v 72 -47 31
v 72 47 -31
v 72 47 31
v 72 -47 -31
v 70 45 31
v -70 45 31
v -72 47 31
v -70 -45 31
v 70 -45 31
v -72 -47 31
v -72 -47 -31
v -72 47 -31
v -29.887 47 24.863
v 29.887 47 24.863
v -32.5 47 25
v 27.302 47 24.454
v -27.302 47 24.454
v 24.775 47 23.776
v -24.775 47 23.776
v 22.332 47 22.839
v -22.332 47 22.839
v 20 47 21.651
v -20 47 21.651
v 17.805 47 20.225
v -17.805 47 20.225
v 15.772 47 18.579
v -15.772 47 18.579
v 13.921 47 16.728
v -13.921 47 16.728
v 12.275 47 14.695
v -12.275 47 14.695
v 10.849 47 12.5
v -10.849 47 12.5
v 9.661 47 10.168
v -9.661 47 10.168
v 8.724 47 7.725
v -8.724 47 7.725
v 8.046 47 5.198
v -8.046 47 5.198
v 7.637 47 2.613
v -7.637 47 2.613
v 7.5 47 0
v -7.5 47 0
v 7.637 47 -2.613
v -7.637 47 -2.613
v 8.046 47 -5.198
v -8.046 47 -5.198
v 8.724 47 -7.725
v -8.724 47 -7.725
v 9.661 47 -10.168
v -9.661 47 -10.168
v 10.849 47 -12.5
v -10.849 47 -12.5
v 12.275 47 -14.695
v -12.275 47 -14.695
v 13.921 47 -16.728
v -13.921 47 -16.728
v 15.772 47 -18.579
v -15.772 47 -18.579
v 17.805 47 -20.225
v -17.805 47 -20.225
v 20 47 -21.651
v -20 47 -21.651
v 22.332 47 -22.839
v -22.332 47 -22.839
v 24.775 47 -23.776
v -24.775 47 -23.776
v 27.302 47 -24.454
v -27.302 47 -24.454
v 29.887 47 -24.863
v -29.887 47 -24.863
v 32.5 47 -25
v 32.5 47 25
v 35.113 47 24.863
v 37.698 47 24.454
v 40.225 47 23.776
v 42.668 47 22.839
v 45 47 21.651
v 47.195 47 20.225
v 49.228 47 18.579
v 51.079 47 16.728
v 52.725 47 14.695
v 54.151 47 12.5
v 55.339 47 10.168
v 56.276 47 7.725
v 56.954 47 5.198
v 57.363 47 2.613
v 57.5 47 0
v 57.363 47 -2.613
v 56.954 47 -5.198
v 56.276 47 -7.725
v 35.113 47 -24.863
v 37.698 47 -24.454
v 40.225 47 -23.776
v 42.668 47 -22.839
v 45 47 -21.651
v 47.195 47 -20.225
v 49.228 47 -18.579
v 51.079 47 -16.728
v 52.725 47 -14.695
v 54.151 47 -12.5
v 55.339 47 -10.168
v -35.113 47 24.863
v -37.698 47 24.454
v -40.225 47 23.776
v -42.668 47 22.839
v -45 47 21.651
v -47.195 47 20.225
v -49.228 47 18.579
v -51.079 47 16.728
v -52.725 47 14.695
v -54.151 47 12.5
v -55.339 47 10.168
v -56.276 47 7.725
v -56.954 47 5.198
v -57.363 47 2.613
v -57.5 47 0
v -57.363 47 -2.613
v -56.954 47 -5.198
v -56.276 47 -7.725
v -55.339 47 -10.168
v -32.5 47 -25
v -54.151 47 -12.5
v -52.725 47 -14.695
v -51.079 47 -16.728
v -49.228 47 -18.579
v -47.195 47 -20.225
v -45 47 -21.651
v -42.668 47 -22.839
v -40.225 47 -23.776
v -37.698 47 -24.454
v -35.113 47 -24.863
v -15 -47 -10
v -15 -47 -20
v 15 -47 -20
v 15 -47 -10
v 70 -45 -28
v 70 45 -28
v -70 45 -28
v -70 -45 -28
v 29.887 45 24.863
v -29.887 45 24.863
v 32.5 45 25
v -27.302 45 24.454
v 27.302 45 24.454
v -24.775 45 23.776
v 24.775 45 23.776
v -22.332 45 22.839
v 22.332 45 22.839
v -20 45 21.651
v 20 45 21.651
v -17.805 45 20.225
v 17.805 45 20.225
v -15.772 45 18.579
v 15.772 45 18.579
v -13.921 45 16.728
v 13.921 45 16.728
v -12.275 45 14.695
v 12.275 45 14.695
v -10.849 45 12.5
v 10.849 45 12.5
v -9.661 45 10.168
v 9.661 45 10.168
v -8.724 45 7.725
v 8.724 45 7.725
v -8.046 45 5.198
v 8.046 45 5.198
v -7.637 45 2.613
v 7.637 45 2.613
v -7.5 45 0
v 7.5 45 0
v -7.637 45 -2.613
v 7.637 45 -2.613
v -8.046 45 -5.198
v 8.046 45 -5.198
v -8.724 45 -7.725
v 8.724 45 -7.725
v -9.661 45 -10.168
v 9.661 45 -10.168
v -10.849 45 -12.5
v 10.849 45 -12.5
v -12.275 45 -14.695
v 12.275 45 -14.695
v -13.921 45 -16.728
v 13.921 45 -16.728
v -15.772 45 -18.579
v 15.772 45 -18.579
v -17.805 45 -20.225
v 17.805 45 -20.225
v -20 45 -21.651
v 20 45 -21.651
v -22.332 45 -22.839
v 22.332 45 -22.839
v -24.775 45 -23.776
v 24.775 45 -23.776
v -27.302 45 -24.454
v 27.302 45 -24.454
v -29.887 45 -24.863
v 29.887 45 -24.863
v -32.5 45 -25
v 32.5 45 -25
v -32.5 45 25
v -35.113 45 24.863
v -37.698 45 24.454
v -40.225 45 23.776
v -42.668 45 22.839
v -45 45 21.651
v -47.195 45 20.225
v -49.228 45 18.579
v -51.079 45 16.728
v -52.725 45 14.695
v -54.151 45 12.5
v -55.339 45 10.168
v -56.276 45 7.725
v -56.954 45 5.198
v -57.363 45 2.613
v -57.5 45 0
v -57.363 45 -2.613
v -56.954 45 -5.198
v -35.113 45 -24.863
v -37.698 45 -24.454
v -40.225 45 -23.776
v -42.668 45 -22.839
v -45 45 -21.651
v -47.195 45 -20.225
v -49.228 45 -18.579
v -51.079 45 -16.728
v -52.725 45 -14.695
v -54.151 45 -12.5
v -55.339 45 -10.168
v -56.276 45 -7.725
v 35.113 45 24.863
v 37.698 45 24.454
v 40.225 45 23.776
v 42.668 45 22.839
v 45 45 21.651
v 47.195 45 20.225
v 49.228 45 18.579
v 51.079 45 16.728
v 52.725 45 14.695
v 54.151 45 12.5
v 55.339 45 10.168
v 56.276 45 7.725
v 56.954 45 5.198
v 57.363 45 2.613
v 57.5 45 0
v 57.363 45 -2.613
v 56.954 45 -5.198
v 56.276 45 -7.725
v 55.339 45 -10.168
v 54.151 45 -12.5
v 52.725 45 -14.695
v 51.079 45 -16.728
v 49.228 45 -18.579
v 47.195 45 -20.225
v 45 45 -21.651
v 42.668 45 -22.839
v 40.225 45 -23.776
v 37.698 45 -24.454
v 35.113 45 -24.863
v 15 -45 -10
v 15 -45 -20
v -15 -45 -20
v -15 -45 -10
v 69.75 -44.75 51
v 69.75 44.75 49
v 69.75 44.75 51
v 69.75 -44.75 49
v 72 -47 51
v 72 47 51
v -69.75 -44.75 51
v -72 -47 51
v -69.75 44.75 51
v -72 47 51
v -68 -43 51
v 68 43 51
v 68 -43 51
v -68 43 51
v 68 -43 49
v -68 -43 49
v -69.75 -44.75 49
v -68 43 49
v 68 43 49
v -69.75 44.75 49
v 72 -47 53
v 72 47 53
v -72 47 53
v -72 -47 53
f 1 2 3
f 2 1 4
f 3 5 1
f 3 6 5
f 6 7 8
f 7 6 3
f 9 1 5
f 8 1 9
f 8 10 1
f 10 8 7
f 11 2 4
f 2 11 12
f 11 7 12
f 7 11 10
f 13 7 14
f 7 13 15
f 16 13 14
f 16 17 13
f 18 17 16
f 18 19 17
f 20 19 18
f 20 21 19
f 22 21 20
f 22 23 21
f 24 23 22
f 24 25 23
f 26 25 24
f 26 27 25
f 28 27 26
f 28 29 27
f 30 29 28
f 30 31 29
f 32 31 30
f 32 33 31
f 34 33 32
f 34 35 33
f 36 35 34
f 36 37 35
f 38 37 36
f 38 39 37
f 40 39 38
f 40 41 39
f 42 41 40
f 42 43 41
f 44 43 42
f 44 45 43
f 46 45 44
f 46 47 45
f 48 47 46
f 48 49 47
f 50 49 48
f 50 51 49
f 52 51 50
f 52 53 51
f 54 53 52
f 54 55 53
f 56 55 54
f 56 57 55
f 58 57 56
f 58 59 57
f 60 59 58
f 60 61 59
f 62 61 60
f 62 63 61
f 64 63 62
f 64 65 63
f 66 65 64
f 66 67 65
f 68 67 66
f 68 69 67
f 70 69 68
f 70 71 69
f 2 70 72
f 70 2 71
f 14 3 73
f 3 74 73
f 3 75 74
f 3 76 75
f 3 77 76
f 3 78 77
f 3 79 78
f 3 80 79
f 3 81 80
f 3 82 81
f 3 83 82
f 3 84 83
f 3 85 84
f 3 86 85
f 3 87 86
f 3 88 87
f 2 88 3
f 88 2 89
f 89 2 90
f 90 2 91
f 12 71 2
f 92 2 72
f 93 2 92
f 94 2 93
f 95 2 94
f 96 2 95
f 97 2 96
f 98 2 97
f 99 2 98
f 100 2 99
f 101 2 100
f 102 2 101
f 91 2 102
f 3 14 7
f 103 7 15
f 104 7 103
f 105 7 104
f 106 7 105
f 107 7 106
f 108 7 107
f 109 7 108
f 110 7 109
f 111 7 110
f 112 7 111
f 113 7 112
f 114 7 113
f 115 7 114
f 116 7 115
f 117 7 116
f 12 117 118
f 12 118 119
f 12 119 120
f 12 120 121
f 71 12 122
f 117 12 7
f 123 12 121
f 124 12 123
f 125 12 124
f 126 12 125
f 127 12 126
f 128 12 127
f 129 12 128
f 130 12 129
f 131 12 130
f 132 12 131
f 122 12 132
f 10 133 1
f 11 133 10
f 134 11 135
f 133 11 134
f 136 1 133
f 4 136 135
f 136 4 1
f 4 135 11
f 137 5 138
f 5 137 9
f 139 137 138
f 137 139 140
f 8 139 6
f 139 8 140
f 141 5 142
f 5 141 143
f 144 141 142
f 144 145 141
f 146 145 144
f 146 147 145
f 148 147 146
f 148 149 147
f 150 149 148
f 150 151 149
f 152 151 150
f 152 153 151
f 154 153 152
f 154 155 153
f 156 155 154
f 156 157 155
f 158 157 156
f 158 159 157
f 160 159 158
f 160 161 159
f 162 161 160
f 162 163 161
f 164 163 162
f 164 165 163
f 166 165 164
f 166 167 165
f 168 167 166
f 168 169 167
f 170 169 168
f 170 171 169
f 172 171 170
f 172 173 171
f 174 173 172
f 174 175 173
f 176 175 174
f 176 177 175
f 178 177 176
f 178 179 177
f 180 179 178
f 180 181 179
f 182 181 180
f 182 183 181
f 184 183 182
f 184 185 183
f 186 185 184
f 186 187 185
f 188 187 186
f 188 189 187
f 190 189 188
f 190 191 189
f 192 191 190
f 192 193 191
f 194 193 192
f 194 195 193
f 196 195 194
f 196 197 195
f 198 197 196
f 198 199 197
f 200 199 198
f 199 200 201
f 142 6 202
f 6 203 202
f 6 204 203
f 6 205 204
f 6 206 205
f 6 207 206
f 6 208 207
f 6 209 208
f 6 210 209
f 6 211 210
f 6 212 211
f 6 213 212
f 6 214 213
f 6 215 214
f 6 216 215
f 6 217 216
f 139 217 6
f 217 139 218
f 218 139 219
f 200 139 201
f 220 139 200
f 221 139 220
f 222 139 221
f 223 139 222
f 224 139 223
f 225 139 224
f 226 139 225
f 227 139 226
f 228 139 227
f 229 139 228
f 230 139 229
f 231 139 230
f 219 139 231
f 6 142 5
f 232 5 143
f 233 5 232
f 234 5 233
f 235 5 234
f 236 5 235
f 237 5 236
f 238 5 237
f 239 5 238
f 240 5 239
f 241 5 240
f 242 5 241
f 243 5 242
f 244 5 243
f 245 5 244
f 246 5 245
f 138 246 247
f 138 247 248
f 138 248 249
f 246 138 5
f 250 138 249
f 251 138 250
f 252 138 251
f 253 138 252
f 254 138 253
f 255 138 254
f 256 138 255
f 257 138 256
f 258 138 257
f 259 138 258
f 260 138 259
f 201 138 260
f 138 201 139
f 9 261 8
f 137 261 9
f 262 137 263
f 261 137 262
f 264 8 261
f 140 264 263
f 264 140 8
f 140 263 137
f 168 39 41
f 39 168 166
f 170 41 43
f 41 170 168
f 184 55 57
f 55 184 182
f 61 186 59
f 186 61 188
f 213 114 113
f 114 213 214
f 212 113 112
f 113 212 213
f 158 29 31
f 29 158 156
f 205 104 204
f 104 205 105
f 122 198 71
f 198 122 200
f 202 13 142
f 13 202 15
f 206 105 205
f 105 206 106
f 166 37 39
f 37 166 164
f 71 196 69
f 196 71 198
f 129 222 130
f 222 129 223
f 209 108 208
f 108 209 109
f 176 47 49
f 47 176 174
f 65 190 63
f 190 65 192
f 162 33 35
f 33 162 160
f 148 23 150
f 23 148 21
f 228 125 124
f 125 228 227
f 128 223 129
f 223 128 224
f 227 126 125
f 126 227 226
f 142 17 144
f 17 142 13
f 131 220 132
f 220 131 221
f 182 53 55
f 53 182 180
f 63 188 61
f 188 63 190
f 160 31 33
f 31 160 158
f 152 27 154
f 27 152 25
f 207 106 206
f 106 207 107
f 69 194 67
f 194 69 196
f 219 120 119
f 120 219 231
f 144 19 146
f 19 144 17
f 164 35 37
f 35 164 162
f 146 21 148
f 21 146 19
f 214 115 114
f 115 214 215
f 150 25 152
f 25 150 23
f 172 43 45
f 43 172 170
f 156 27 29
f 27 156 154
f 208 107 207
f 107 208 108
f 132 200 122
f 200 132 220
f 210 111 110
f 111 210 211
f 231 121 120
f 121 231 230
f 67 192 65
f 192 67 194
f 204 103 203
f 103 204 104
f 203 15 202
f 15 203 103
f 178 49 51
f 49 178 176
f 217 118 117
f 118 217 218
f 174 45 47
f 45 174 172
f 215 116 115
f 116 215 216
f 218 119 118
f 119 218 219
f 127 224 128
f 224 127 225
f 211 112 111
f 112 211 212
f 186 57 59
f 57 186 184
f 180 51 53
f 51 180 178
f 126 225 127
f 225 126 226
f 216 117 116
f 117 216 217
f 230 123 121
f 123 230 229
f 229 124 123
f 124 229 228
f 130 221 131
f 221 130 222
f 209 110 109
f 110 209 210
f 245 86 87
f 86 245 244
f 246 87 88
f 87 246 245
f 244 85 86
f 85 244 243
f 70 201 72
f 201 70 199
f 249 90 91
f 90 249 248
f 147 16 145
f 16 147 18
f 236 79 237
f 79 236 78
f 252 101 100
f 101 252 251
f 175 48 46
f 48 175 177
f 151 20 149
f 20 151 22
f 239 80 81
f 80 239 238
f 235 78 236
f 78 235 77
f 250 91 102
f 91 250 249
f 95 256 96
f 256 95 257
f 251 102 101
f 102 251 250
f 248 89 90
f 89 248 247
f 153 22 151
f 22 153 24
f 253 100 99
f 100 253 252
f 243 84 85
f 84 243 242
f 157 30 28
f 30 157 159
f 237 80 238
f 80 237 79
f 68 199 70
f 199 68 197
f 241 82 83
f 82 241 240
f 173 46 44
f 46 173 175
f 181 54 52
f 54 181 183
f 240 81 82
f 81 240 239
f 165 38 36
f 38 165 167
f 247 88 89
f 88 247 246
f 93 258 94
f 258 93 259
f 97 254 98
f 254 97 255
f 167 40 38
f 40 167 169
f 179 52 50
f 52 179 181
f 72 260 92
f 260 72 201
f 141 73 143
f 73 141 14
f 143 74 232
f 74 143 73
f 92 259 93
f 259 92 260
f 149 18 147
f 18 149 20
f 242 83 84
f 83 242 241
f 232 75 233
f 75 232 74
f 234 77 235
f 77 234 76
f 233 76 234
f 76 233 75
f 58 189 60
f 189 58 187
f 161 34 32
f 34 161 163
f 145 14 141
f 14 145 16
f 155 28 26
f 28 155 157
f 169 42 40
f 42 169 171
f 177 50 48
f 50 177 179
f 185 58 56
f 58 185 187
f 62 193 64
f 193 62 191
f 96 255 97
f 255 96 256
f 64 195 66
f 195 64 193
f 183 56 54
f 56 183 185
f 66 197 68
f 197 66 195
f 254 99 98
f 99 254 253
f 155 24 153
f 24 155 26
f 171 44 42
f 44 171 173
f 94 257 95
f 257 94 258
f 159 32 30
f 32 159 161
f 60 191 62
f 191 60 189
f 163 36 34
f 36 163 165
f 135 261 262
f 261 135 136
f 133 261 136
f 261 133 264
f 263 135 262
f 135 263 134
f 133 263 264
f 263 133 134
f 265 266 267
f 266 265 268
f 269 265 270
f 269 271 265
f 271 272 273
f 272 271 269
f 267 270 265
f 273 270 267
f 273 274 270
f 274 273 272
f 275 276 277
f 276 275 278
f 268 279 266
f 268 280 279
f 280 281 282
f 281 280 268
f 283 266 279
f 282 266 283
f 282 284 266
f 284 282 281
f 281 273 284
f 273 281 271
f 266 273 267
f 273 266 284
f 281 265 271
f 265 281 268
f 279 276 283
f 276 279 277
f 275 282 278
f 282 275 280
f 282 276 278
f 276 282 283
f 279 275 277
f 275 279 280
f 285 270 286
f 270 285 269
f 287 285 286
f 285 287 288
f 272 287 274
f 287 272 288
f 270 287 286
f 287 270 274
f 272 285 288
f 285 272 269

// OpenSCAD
// Caixa 3D do Boi (ESP32 + Relé + Amplificador + 2 Alto-Falantes 2")
// Para gerar o arquivo STL para impressão 3D, instale o software grátis OpenSCAD (openscad.org),
// cole este código e aperte F6 para renderizar, depois F7 para exportar para STL.

$fn = 60; // Suavização dos círculos

// Dimensões internas da caixa (Ajustado para caber os componentes)
width = 140;   
length = 90;   
height = 60;   
wall = 2; // Espessura da parede da caixa de plástico

// Variáveis do Alto-Falante (2 polegadas = ~50mm)
speaker_dia = 50; 
speaker_spacing = 65; 

module box() {
    difference() {
        // Corpo principal externo
        cube([width + wall*2, length + wall*2, height + wall], center=true);
        
        // Oco interno
        translate([0, 0, wall])
            cube([width, length, height], center=true);
            
        // Furos redondos frontais para os 2 Alto-falantes de 2" (50mm)
        translate([-speaker_spacing/2, (length/2 + wall/2), 0])
            rotate([90, 0, 0])
            cylinder(h=wall*3, d=speaker_dia, center=true);
            
        translate([speaker_spacing/2, (length/2 + wall/2), 0])
            rotate([90, 0, 0])
            cylinder(h=wall*3, d=speaker_dia, center=true);
            
        // Rasgo traseiro para passar os fios da Fita Touch, Botão e Fonte de Energia
        translate([0, -(length/2 + wall/2), -height/4])
            cube([30, wall*3, 10], center=true);
            
        // Rasgos superiores para Ventilação (Calor do Relé e Amplificador)
        for(i = [-30 : 15 : 30]) {
            translate([i, 0, height/2 + wall/2])
                cube([5, 60, wall*3], center=true);
        }
    }
}

module lid() {
    // Tampa de encaixe simples
    translate([0, 0, height/2 + wall + 20]) { // A tampa é desenhada acima da caixa
        union() {
            // Topo da tampa
            cube([width + wall*2, length + wall*2, wall], center=true);
            // Aba interna para encaixar por dentro da caixa
            translate([0, 0, -wall])
                difference() {
                    cube([width - 0.5, length - 0.5, wall], center=true);
                    cube([width - 4, length - 4, wall*2], center=true); // oca a aba
                }
        }
    }
}

// Renderiza a caixa e a tampa (Para impressão, comente a tampa ou a caixa para gerar dois STLs separados)
box();
lid();
